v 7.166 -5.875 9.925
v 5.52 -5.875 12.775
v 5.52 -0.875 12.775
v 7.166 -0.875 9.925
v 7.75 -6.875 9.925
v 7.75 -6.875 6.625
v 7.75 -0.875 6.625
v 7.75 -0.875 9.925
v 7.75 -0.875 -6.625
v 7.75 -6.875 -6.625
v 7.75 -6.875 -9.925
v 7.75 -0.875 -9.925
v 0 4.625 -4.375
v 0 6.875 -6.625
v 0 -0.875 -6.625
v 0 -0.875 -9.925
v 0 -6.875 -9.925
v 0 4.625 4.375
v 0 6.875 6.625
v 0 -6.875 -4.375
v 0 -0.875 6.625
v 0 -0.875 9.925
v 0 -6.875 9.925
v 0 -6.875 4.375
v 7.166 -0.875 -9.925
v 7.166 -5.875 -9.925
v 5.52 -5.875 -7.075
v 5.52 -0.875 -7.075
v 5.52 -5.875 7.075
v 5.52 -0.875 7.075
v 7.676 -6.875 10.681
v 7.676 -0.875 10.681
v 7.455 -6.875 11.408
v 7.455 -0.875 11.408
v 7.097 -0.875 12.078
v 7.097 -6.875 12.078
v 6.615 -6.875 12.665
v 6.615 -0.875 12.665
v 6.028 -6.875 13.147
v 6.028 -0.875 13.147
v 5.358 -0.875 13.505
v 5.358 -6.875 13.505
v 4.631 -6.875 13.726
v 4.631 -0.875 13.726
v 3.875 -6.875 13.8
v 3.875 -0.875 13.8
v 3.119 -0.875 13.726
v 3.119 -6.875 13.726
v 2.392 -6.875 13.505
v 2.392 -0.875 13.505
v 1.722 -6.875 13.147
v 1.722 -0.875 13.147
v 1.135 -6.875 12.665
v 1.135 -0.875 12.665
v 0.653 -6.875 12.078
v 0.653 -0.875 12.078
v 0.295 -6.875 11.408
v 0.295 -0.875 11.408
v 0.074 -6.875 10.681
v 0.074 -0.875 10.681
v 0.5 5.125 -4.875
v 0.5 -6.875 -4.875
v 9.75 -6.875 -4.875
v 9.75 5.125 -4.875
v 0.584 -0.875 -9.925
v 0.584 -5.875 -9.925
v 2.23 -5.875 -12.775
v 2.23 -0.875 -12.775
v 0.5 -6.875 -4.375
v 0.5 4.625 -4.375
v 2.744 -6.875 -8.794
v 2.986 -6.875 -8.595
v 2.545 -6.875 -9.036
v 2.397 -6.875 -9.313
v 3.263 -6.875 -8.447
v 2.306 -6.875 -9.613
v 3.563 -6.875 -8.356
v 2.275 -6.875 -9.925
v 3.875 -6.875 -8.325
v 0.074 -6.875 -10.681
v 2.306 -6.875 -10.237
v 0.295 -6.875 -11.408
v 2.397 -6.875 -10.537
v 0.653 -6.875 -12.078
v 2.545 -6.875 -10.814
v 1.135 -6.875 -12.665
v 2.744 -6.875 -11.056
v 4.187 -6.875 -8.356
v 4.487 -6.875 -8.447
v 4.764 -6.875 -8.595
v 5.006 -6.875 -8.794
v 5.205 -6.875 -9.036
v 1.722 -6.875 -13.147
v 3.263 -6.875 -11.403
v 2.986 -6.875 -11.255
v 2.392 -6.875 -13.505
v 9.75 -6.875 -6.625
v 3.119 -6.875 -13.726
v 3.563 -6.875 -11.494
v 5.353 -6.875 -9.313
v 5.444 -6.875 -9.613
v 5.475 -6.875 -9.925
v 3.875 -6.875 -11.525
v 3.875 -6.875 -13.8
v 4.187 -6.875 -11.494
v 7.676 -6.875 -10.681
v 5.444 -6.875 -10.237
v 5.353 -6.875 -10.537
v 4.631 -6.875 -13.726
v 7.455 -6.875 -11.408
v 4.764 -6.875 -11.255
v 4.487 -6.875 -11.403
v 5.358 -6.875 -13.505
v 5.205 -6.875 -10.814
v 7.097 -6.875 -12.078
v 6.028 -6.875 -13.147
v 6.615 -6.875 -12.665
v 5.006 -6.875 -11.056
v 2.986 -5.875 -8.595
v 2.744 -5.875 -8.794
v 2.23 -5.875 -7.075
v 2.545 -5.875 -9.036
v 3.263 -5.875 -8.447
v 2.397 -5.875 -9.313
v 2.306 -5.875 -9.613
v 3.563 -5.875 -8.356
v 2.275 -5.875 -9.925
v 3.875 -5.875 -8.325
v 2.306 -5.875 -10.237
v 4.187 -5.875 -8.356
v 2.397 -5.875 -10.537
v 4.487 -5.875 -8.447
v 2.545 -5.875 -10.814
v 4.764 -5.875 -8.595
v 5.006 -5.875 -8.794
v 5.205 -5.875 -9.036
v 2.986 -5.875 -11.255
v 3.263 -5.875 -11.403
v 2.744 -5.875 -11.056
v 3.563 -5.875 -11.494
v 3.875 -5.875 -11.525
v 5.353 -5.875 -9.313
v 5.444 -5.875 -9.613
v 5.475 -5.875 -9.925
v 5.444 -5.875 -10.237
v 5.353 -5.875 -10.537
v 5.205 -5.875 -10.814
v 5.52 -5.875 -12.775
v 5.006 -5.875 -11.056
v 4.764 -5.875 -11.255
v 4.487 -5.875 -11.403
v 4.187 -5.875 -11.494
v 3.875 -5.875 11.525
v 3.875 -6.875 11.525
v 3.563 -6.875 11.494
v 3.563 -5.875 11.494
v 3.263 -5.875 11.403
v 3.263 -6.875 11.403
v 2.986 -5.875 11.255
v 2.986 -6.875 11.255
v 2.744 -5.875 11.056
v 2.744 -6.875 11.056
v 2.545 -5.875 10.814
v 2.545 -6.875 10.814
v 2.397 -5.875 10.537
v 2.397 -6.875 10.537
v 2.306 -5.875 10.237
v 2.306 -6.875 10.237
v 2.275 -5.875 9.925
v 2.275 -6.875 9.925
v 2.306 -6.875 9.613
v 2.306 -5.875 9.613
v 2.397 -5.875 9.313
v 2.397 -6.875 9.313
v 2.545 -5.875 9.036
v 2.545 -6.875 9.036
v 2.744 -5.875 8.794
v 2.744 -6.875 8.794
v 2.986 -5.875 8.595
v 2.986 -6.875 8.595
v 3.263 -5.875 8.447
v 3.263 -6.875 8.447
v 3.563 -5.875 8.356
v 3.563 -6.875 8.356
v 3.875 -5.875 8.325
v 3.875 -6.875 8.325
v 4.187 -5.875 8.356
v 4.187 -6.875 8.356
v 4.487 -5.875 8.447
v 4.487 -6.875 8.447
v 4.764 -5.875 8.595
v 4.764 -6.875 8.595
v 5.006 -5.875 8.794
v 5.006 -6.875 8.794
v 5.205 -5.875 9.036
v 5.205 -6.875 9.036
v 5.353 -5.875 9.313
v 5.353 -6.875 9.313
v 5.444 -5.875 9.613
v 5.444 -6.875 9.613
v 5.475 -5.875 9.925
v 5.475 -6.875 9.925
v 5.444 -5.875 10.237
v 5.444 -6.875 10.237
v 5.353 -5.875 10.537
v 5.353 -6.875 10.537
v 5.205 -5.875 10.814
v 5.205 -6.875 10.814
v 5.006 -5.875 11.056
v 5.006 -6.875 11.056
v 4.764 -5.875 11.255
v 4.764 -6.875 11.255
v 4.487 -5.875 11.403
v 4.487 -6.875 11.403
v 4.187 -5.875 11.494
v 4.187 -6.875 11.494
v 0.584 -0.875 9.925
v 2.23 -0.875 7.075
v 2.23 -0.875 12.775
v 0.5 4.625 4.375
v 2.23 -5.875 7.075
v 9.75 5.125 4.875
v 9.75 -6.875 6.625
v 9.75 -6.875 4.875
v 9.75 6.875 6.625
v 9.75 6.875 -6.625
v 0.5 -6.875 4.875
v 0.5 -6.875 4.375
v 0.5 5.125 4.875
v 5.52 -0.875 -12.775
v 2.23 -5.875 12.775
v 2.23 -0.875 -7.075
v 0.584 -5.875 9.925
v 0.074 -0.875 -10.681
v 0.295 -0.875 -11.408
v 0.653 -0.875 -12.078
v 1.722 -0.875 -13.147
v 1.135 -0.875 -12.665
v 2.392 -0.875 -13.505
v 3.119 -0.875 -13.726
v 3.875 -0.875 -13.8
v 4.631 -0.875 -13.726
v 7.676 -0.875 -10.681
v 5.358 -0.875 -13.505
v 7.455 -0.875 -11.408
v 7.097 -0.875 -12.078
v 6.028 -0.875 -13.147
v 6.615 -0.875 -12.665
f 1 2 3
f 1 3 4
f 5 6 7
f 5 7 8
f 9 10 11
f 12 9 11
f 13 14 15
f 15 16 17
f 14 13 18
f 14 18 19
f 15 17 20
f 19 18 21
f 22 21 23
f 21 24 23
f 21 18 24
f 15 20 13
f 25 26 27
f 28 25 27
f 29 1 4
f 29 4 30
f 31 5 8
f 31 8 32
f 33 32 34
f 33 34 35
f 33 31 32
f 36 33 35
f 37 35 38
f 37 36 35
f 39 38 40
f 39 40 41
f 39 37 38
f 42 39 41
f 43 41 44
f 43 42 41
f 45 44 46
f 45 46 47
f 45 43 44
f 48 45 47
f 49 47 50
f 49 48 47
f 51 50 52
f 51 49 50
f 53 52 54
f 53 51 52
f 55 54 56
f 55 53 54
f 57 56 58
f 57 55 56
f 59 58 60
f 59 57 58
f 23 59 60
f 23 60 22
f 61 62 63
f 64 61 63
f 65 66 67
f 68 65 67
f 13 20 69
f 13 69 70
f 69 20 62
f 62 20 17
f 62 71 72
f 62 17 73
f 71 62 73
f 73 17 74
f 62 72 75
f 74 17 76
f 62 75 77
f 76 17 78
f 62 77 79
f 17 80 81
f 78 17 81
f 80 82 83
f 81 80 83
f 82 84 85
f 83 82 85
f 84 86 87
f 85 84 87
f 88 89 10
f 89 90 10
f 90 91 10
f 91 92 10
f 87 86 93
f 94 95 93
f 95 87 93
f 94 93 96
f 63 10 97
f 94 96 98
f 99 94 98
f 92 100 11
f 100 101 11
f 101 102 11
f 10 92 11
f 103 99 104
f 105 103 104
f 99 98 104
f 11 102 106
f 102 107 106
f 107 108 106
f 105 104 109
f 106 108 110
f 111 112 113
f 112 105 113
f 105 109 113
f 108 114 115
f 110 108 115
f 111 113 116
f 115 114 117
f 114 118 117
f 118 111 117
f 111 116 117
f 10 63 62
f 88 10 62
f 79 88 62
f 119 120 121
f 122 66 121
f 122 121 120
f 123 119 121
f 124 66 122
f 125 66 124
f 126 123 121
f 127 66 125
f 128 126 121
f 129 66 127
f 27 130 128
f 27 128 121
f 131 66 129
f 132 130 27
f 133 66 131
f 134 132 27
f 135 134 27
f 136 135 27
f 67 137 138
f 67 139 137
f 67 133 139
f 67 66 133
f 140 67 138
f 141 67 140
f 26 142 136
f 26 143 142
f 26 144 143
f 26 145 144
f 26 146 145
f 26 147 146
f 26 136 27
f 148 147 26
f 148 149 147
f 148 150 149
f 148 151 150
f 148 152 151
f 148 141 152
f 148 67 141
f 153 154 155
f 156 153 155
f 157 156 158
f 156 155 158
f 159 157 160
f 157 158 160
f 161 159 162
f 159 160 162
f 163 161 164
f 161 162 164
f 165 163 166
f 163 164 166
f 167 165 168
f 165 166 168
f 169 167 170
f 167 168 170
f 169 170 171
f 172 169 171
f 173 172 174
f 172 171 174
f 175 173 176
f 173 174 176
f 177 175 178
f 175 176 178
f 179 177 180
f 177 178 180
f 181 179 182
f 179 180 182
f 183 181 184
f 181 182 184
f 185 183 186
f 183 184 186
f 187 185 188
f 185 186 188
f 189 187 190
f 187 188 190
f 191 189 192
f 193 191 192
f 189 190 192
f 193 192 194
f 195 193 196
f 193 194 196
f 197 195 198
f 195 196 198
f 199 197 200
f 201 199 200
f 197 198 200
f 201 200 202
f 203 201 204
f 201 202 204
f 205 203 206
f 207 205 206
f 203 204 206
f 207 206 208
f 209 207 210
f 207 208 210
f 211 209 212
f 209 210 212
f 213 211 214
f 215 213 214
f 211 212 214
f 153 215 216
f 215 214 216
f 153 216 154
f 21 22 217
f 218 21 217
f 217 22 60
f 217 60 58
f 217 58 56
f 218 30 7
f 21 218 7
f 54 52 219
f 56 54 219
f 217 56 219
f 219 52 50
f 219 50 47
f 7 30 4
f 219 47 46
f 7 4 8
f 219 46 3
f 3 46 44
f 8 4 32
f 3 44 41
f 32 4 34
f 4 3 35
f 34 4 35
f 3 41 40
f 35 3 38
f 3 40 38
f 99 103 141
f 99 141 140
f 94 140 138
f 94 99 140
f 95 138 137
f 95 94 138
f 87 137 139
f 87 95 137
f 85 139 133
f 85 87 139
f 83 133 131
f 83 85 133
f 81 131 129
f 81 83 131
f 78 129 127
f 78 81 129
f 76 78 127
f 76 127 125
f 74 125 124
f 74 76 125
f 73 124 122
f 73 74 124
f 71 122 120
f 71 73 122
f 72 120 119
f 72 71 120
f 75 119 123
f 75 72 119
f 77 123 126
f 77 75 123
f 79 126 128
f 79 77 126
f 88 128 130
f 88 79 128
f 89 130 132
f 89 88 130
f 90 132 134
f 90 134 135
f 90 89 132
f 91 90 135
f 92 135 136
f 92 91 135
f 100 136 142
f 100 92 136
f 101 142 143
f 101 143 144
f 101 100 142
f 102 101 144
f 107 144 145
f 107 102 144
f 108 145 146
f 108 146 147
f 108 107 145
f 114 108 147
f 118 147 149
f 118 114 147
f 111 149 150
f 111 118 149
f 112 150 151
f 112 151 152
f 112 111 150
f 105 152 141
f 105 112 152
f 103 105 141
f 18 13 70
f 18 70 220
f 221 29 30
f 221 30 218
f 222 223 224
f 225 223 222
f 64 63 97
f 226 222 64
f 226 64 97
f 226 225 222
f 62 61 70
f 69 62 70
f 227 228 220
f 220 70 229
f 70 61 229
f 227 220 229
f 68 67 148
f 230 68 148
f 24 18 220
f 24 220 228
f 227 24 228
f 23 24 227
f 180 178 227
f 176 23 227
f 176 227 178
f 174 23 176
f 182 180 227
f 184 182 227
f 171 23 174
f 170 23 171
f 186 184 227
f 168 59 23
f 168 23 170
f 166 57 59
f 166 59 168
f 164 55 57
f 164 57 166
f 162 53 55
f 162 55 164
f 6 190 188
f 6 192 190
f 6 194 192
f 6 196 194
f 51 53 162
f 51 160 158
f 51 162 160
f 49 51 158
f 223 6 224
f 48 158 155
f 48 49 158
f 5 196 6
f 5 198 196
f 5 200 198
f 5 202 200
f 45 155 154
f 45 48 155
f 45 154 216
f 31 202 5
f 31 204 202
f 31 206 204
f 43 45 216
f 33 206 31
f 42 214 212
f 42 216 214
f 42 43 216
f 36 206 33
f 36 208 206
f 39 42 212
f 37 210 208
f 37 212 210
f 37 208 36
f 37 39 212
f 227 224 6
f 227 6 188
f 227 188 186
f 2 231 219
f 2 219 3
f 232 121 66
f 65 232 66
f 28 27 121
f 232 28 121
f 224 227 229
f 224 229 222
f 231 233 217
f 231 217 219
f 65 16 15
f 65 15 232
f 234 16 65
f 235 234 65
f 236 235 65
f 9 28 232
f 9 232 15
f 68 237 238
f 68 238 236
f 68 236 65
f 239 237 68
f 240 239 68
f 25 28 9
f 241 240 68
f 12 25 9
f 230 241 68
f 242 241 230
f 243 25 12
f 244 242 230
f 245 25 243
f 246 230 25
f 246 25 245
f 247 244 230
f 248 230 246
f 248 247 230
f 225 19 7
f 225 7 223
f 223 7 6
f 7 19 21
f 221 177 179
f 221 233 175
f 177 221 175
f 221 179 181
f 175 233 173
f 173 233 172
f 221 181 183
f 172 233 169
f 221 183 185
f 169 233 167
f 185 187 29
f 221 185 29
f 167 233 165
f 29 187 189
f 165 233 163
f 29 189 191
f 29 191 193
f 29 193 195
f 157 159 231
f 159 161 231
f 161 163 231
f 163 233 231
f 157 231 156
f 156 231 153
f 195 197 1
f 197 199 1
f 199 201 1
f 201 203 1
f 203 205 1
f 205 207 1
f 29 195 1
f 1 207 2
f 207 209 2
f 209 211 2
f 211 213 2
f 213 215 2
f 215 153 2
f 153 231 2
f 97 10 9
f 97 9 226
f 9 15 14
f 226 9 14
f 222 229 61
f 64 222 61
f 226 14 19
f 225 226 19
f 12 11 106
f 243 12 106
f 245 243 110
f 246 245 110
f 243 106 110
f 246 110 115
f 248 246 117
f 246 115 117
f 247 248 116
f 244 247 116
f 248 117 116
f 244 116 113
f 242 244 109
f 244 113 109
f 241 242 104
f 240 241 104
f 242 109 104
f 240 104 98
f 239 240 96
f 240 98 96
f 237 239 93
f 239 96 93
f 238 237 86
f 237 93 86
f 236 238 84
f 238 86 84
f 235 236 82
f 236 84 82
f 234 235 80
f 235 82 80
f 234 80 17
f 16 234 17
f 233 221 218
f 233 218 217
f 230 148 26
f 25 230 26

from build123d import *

# Parameters (mm, degrees)
BOSS_EXTRUDE1_DEPTH = 9.75
BOSS_EXTRUDE2_START = -1
BOSS_EXTRUDE2_DEPTH = 5
BOSS_EXTRUDE3_START = 1
SKETCH3_R           = 1.6
BOSS_EXTRUDE3_DEPTH = 1
BOSS_EXTRUDE4_DEPTH = 0.5


with BuildPart() as part:
    # Sketch1 → Boss-Extrude1 (new body)
    with BuildSketch(Plane(origin=(0, 0, 0), x_dir=(0, 0, -1), z_dir=(1, 0, 0))):
        Polygon((-4.875, -6.875), (-4.875, 5.125), (4.875, 5.125), (4.875, -6.875), (6.625, -6.875), (6.625, 6.875), (-6.625, 6.875), (-6.625, -6.875), align=None)
    extrude(amount=BOSS_EXTRUDE1_DEPTH)

    # Sketch2 → Boss-Extrude2 (add)
    with BuildSketch(Plane.XZ.offset(6.875).offset(BOSS_EXTRUDE2_START)):
        with BuildLine():
            Line((0, 9.925), (0, 4.875))
            Line((0, 4.875), (7.75, 4.875))
            Line((7.75, 4.875), (7.75, 9.925))
            ThreePointArc((7.75, 9.925), (3.875, 13.8), (0, 9.925))
        make_face()
        Polygon((0.584103466, 9.925), (2.229551733, 12.775), (5.520448267, 12.775), (7.165896534, 9.925), (5.520448267, 7.075), (2.229551733, 7.075), align=None, mode=Mode.SUBTRACT)
    boss_extrude2 = extrude(amount=-BOSS_EXTRUDE2_DEPTH)

    # Sketch3 → Boss-Extrude3 (add)
    with BuildSketch(Plane.XZ.offset(5.875).offset(BOSS_EXTRUDE3_START)):
        with BuildLine():
            Line((7.75, 6.625), (7.75, 9.925))
            ThreePointArc((7.75, 9.925), (3.875, 13.8), (0, 9.925))
            Line((0, 9.925), (0, 6.625))
            Line((0, 6.625), (7.75, 6.625))
        make_face()
        with Locations(Location((3.875, 9.925, 0), (0, 0, 90))):
            Circle(SKETCH3_R, mode=Mode.SUBTRACT)
    boss_extrude3 = extrude(amount=-BOSS_EXTRUDE3_DEPTH)

    # Mirror1: Boss-Extrude2, Boss-Extrude3 across plane
    add(boss_extrude2.mirror(Plane.XY))
    add(boss_extrude3.mirror(Plane.XY))

    # Sketch4 → Boss-Extrude4 (add)
    with BuildSketch(Plane.ZY):
        Polygon((-6.625, 6.875), (-6.625, -6.875), (-4.375, -6.875), (-4.375, 4.625), (4.375, 4.625), (4.375, -6.875), (6.625, -6.875), (6.625, 6.875), align=None)
    extrude(amount=-BOSS_EXTRUDE4_DEPTH)


solid = part.part
